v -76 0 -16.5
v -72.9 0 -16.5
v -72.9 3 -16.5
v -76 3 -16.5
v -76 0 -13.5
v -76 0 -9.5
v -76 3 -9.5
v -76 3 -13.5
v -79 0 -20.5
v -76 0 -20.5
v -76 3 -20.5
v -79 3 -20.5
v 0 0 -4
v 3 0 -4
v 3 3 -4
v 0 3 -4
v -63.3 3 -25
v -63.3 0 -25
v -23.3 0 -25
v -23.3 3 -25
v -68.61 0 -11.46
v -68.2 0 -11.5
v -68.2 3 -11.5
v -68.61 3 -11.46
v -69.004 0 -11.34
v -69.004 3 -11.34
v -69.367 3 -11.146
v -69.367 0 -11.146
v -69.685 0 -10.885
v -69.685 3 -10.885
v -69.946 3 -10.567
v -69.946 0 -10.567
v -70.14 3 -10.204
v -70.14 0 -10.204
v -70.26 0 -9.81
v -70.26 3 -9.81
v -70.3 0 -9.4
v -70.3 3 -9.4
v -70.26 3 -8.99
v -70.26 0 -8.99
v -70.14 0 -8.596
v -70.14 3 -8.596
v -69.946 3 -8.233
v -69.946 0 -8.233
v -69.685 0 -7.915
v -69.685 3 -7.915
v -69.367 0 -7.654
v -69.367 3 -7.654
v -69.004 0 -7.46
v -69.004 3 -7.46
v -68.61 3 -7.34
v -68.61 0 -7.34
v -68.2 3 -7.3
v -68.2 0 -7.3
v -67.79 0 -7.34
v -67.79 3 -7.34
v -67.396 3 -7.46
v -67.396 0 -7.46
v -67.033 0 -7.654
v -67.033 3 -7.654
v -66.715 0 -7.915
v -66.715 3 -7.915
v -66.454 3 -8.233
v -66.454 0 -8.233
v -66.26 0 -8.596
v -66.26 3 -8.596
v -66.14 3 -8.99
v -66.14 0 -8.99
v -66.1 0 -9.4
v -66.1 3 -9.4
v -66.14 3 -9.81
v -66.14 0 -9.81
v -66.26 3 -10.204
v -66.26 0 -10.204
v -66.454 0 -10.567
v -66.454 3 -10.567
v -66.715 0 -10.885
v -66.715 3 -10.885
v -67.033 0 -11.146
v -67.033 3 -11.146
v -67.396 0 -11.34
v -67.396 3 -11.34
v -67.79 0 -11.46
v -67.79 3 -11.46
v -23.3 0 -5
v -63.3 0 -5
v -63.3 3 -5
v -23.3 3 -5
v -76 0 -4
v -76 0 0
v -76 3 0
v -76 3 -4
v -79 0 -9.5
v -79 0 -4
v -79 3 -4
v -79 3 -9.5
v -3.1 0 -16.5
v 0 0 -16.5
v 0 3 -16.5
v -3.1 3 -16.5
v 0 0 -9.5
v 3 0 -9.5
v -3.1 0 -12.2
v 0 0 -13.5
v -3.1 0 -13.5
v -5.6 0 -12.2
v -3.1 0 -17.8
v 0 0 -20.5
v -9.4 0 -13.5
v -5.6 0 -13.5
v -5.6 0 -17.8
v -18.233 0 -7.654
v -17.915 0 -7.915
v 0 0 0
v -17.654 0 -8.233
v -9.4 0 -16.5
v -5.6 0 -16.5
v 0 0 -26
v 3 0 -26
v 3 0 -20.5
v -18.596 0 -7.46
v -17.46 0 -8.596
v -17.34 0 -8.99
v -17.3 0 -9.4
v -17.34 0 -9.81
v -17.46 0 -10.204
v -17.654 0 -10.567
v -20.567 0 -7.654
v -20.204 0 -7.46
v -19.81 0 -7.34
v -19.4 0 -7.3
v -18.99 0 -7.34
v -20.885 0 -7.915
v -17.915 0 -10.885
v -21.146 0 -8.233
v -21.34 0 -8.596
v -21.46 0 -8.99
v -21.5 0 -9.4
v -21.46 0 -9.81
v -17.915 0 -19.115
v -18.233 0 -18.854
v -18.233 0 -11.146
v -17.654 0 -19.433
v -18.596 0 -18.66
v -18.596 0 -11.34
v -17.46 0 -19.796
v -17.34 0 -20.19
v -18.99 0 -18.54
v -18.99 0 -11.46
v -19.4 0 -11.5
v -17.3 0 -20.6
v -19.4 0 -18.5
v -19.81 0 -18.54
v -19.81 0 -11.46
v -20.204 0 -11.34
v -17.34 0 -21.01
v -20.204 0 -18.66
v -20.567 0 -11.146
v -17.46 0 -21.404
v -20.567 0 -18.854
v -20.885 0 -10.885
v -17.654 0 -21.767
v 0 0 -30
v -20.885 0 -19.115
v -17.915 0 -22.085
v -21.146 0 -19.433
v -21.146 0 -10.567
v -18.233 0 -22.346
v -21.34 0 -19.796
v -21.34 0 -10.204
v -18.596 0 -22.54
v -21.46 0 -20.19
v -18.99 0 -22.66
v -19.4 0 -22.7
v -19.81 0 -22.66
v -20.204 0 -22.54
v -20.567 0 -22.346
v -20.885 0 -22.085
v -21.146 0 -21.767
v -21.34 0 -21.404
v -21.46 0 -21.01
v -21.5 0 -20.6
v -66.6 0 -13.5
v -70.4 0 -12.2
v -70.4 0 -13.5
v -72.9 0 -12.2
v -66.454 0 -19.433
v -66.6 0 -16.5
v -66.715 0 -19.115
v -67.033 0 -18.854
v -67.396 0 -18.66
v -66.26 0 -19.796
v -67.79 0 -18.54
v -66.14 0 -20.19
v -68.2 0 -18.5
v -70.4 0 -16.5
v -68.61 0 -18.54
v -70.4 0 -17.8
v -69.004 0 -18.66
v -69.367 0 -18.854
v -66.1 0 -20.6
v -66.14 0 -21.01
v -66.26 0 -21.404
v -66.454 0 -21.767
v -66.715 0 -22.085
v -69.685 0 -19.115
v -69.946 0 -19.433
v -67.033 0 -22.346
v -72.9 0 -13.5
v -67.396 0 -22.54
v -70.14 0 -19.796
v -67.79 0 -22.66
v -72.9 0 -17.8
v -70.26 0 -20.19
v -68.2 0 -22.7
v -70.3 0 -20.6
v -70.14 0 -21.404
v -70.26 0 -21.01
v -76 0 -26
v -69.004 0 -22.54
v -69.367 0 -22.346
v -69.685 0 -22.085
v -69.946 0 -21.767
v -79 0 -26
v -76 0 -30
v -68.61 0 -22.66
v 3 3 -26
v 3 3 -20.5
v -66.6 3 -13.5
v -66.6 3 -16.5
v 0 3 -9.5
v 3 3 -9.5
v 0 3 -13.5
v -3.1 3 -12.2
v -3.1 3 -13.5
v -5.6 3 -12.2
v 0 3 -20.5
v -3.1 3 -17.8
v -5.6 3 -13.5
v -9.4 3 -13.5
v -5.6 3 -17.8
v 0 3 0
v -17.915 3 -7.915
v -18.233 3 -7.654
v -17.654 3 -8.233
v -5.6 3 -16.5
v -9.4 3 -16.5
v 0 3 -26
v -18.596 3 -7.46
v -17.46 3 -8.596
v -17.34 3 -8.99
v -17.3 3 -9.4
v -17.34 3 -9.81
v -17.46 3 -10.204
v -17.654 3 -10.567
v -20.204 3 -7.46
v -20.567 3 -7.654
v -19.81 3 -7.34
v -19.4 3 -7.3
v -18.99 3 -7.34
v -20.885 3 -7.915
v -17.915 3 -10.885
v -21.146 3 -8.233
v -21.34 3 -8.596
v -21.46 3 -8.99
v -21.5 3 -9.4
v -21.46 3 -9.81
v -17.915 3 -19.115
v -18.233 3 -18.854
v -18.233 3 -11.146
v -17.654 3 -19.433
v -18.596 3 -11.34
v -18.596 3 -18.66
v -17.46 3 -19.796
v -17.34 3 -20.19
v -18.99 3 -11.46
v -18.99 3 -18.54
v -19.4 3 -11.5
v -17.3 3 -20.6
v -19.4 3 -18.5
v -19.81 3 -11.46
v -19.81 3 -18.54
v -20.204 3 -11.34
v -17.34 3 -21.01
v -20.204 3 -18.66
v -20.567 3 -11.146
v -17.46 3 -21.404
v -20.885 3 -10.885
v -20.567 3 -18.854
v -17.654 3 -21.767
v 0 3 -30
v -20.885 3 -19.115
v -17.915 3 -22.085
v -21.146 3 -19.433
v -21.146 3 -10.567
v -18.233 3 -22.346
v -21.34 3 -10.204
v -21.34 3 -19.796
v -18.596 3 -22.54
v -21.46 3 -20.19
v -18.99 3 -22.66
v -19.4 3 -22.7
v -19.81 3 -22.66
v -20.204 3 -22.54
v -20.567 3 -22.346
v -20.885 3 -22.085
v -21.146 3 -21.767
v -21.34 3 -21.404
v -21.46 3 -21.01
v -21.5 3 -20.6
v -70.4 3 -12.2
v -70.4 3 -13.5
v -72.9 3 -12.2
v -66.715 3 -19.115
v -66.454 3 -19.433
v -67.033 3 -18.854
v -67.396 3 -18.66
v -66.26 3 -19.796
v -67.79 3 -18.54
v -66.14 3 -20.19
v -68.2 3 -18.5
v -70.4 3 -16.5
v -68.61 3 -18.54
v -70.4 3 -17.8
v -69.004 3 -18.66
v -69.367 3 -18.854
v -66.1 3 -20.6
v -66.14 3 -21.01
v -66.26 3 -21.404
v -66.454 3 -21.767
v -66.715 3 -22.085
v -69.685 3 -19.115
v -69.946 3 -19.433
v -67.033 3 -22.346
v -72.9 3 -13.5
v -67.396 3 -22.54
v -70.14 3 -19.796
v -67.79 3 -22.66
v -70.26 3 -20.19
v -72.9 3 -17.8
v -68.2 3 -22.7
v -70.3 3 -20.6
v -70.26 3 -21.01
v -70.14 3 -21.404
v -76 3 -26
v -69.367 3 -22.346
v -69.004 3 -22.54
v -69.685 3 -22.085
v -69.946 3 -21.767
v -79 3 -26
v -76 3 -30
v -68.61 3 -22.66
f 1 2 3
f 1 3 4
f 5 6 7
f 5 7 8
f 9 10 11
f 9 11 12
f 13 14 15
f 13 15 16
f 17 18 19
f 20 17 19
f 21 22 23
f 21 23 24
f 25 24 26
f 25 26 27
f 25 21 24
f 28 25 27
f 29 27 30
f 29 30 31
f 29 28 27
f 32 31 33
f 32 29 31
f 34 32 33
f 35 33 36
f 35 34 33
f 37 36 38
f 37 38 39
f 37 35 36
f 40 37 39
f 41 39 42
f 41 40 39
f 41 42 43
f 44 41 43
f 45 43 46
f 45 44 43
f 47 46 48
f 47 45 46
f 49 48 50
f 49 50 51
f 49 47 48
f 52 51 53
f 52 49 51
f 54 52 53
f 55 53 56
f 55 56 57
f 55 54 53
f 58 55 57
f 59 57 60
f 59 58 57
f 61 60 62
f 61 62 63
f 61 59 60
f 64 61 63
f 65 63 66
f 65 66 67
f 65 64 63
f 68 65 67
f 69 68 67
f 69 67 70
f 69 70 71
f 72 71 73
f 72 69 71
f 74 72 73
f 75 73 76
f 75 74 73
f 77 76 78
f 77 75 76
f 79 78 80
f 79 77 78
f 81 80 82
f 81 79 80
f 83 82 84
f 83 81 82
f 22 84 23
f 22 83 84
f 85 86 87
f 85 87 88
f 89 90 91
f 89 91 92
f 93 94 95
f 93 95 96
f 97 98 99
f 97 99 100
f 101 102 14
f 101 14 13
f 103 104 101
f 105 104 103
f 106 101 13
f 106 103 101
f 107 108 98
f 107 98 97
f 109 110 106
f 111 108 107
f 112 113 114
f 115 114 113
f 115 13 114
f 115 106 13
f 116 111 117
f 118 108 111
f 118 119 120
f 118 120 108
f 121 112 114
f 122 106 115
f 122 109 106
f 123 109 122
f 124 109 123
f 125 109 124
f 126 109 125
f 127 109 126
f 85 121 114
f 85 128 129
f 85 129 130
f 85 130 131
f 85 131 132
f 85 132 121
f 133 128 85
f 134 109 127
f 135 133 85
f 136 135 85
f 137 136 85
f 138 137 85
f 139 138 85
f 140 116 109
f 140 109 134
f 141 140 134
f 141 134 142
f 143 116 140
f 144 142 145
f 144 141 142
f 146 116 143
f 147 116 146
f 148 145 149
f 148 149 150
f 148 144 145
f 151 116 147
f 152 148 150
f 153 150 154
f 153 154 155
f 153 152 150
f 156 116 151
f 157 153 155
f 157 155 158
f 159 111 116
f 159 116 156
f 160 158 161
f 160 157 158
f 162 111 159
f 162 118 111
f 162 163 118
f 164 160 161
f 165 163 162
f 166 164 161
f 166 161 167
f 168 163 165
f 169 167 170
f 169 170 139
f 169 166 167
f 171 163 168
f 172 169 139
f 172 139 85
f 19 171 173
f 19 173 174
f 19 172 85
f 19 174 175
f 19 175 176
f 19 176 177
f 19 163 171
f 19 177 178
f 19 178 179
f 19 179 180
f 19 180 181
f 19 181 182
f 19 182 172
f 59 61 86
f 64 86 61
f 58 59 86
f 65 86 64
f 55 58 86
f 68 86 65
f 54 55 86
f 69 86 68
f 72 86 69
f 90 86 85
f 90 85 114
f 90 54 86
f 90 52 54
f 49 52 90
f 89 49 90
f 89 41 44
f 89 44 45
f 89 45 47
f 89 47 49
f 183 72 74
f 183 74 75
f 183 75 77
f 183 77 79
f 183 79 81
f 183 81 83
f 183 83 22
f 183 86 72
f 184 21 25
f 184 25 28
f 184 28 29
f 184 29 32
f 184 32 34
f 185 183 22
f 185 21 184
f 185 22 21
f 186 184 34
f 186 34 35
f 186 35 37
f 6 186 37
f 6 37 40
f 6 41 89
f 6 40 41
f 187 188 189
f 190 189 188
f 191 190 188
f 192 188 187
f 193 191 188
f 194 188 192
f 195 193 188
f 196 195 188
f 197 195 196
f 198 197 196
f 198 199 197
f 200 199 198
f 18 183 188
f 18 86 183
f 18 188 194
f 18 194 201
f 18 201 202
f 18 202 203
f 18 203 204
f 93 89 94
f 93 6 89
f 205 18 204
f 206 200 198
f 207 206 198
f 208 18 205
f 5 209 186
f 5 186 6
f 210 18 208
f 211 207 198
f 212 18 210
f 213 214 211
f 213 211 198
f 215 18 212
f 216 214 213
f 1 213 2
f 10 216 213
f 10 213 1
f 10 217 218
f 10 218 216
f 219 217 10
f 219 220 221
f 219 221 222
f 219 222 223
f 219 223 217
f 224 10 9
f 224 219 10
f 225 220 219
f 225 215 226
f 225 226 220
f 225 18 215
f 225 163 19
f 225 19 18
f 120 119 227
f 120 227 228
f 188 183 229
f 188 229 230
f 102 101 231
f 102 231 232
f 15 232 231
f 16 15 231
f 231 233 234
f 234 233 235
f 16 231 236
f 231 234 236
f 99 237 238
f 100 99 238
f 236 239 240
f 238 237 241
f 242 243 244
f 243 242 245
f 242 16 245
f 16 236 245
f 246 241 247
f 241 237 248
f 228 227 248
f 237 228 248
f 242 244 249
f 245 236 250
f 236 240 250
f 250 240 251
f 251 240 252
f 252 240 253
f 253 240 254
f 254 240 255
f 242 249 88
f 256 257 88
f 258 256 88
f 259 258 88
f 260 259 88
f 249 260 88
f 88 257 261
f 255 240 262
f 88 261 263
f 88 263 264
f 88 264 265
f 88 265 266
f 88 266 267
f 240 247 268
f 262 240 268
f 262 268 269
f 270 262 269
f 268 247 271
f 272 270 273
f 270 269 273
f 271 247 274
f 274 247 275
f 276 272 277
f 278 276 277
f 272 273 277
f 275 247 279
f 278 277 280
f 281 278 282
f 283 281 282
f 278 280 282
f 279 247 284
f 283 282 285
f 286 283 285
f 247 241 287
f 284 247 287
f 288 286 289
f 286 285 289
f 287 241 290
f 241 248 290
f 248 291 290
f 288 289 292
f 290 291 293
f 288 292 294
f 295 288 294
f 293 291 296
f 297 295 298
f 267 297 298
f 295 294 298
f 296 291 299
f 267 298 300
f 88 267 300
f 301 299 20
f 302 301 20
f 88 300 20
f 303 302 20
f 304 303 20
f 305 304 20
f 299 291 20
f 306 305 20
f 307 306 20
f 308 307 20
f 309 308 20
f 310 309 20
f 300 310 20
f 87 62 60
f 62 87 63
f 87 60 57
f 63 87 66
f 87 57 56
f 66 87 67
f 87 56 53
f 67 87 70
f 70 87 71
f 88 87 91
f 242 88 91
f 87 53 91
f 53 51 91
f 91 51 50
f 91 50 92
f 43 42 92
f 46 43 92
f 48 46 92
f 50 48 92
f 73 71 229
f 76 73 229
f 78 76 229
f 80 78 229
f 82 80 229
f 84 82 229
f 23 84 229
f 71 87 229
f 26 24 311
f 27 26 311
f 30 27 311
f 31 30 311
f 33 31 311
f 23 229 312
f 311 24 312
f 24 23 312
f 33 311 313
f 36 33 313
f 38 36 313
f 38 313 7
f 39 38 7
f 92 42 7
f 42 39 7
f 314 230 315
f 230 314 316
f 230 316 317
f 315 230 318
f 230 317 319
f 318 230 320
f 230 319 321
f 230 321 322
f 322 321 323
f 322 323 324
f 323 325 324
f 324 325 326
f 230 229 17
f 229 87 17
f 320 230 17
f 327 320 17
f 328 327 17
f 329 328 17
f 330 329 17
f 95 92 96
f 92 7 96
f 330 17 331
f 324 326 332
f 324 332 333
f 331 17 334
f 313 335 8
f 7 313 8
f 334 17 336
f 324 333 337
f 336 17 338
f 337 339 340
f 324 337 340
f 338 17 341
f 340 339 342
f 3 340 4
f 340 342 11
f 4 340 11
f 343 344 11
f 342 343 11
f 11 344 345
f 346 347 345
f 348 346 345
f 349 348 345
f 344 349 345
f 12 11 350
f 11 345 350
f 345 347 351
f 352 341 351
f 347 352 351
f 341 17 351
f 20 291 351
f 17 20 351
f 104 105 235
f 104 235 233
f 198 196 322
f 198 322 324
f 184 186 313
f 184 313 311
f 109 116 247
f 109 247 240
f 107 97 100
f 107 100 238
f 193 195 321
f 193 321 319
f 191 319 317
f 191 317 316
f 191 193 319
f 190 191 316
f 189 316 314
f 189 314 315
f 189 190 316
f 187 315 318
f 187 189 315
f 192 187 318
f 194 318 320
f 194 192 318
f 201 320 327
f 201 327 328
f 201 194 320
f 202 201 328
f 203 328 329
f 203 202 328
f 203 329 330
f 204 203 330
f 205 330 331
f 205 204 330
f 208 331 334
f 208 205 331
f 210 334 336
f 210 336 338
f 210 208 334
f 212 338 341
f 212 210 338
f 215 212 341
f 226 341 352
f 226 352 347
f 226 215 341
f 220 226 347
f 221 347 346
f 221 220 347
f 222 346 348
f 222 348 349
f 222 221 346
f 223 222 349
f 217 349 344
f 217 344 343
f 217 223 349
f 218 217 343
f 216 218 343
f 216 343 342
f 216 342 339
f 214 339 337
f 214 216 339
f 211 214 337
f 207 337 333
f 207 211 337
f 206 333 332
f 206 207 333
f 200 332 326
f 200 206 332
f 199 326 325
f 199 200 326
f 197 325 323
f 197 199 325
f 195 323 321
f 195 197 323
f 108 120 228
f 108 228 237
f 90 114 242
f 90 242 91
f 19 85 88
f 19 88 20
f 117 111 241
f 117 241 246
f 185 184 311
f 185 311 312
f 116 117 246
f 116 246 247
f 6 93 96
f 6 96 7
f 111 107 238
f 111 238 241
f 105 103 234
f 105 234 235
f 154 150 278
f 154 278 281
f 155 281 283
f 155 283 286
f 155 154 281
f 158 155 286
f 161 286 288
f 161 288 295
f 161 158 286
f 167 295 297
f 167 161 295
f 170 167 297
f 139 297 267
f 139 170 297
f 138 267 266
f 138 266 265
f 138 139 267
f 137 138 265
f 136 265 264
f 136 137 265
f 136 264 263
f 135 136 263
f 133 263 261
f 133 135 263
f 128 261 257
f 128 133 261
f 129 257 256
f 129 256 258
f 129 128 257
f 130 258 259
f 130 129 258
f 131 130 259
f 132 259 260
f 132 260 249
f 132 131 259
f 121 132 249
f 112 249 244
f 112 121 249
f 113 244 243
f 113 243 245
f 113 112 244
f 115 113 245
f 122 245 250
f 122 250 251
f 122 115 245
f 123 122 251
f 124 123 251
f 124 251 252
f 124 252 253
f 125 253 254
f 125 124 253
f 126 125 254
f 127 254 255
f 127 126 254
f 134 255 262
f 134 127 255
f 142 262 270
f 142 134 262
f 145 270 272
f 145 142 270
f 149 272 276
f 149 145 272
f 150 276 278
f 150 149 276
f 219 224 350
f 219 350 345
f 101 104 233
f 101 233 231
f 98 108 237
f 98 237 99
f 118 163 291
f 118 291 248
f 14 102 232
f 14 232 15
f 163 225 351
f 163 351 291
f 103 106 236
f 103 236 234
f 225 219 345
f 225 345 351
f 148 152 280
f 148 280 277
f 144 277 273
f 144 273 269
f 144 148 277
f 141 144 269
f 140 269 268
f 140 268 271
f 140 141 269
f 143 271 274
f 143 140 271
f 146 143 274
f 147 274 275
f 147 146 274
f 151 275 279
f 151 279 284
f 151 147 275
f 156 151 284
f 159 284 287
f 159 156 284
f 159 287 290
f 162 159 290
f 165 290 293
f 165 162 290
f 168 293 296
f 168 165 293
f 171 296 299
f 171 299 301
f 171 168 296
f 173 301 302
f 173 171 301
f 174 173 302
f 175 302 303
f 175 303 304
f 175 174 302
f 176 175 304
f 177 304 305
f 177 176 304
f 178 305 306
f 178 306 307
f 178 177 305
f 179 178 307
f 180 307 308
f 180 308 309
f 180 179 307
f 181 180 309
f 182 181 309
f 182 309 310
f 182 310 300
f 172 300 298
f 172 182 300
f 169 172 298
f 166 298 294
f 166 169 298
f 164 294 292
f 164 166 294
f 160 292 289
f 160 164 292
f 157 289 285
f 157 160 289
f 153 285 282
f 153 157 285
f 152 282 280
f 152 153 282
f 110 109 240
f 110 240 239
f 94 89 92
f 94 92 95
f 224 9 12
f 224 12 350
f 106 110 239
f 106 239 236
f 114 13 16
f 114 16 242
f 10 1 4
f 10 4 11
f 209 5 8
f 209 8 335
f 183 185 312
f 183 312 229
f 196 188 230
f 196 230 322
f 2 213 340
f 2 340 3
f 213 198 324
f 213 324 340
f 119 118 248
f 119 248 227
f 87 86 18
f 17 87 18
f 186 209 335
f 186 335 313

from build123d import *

# Parameters (mm, degrees)
SKETCH1_R           = 2.1
SKETCH1_W           = 40
SKETCH1_H           = 20
BOSS_EXTRUDE1_DEPTH = 3


with BuildPart() as part:
    # Sketch1 → Boss-Extrude1 (new body)
    with BuildSketch(Plane(origin=(0, 0, 0), x_dir=(1, 0, 0), z_dir=(0, 1, 0))):
        Polygon((0, 0), (-76, 0), (-76, 4), (-79, 4), (-79, 9.5), (-76, 9.5), (-76, 13.5), (-72.9, 13.5), (-72.9, 12.2), (-70.4, 12.2), (-70.4, 13.5), (-66.6, 13.5), (-66.6, 16.5), (-70.4, 16.5), (-70.4, 17.8), (-72.9, 17.8), (-72.9, 16.5), (-76, 16.5), (-76, 20.5), (-79, 20.5), (-79, 26), (-76, 26), (-76, 30), (0, 30), (0, 26), (3, 26), (3, 20.5), (0, 20.5), (0, 16.5), (-3.1, 16.5), (-3.1, 17.8), (-5.6, 17.8), (-5.6, 16.5), (-9.4, 16.5), (-9.4, 13.5), (-5.6, 13.5), (-5.6, 12.2), (-3.1, 12.2), (-3.1, 13.5), (0, 13.5), (0, 9.5), (3, 9.5), (3, 4), (0, 4), align=None)
        with Locations(Location((-19.4, 20.6, 0), (0, 0, 270))):
            Circle(SKETCH1_R, mode=Mode.SUBTRACT)
        with Locations(Location((-68.2, 20.6, 0), (0, 0, 270))):
            Circle(SKETCH1_R, mode=Mode.SUBTRACT)
        with Locations(Location((-68.2, 9.4, 0), (0, 0, 90))):
            Circle(SKETCH1_R, mode=Mode.SUBTRACT)
        with Locations(Location((-19.4, 9.4, 0), (0, 0, 90))):
            Circle(SKETCH1_R, mode=Mode.SUBTRACT)
        with Locations((-43.3, 15)):
            Rectangle(SKETCH1_W, SKETCH1_H, mode=Mode.SUBTRACT)
    extrude(amount=BOSS_EXTRUDE1_DEPTH)


solid = part.part
